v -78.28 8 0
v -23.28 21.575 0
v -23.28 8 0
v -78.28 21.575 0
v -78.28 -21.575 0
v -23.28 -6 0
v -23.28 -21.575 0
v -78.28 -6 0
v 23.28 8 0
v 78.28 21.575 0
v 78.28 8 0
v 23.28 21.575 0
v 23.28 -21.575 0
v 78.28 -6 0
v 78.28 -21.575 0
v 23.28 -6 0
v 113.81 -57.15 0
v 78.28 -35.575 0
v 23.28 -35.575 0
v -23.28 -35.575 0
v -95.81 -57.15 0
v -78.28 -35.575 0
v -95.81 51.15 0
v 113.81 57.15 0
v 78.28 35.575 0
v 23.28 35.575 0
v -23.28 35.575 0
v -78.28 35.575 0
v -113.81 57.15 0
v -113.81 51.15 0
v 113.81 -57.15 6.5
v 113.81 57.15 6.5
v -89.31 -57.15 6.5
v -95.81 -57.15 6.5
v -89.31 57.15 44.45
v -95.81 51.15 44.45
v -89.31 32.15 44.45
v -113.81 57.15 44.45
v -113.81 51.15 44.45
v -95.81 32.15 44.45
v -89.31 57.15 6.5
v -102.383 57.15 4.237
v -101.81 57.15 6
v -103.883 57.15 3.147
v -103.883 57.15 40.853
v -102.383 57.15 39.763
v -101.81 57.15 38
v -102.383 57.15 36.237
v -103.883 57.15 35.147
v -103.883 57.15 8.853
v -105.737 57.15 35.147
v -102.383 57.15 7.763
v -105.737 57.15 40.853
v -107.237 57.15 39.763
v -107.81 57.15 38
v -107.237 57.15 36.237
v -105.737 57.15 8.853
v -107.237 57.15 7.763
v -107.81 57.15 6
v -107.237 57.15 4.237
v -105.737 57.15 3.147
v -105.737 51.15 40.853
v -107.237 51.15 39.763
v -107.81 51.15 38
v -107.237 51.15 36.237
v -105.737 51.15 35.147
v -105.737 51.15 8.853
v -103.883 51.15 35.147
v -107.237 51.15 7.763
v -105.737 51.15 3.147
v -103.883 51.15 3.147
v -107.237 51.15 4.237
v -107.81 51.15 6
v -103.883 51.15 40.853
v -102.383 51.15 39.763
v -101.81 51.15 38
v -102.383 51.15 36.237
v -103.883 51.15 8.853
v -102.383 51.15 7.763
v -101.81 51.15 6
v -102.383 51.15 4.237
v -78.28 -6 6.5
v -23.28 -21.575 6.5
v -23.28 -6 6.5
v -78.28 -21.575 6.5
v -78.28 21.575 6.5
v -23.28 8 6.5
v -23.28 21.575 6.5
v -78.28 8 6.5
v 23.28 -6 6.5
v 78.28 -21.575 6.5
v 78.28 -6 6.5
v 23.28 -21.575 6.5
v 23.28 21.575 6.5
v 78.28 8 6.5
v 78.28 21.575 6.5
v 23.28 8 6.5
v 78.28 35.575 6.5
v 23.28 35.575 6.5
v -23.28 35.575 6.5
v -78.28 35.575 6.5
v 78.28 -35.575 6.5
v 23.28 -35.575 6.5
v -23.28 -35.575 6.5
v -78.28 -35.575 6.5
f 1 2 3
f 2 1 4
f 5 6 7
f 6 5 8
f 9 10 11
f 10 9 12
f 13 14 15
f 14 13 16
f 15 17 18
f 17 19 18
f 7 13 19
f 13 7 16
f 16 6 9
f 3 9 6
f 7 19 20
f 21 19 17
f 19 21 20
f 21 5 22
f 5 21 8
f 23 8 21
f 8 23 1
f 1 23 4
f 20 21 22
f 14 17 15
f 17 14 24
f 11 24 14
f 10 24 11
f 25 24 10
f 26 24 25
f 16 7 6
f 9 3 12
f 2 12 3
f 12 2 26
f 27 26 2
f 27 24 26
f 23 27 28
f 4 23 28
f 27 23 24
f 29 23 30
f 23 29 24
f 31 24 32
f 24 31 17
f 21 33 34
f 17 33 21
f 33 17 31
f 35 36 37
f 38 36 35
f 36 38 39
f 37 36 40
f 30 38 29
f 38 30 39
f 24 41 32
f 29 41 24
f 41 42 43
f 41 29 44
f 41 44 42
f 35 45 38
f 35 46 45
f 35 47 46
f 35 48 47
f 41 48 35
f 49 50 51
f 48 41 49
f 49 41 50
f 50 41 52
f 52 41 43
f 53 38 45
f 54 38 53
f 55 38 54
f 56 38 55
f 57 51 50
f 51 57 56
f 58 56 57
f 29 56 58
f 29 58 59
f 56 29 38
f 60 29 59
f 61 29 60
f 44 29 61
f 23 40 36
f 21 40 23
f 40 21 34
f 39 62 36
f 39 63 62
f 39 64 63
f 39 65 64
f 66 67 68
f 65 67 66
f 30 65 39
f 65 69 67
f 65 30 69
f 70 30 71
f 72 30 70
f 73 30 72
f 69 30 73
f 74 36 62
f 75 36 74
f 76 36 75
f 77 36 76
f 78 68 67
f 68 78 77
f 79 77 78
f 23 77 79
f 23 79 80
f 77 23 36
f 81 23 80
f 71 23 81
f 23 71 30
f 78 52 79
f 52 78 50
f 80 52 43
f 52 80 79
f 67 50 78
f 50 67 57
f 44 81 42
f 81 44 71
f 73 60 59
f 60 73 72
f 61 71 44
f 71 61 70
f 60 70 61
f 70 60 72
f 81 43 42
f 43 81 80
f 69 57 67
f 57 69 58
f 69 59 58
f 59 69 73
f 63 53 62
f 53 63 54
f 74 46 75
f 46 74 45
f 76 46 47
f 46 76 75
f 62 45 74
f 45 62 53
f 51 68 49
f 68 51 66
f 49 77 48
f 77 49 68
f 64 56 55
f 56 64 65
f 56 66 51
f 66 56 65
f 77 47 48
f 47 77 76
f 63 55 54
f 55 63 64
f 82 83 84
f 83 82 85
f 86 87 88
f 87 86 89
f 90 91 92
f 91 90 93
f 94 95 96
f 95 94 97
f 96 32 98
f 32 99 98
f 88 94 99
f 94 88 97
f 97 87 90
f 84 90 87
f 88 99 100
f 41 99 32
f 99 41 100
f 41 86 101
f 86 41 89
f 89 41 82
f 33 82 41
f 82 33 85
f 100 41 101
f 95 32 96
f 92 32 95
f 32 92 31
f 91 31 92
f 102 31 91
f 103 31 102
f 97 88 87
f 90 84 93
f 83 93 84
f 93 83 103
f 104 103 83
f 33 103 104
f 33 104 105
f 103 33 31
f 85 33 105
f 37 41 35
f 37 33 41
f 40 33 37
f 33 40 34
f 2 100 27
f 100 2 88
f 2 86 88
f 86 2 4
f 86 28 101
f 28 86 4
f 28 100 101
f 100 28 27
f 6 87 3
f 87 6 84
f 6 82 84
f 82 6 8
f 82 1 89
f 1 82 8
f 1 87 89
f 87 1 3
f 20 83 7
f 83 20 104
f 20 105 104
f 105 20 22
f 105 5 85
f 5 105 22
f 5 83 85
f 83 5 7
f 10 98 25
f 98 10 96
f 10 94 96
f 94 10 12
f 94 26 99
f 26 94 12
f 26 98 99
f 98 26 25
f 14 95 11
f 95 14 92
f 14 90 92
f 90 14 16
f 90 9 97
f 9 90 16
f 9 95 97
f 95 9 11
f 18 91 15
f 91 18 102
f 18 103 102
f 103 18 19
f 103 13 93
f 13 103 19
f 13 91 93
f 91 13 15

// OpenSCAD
// obj
wid=227.62;
dep=114.30;
hei=44.45;

// mount lip
lip_wid_back=18;
lip_dep_pos=6;
lip_dep=dep-lip_dep_pos;
lip_guard=6.5;
lip_decline_dep=25;

// screw holes
dia=6;
bot_pos=3;
sep_dist=32;
screw_hei=lip_dep_pos+0.1; // figure out why we need this 0.1

// body
body_platform=6.5;
body_wid=wid-lip_wid_back-lip_guard;
body_dep=dep;
body_hei=hei-body_platform;

// vents
// 55 x 14
vent_wid=55;
vent_hei=14;

module screw_hole(sd) {
  translate([-wid/2+lip_wid_back/2,dep/2-lip_dep_pos/2,bot_pos+dia/2+sd])
    rotate([90,,])
      cylinder(screw_hei,d=dia,center=true);
}

module vent(x,y) {
  translate([-body_wid/x,body_dep/y,0])
    linear_extrude(body_platform)
      polygon([
        [-vent_wid/2, -vent_hei/2],
        [-vent_wid/2, vent_hei/2],
        [vent_wid/2, vent_hei/2],
        [vent_wid/2, -vent_hei/2],
      ]);
}

difference() {
  // whole shelf
  linear_extrude(hei)
    polygon([
      [-wid/2, -dep/2],
      [-wid/2, dep/2],
      [wid/2, dep/2],
      [wid/2, -dep/2],
    ]);
  
  // lip
  linear_extrude(hei)
    translate([-wid/2+lip_wid_back/2,-lip_dep_pos/2,0])
      polygon([
        [-lip_wid_back/2, -lip_dep/2],
        [-lip_wid_back/2, lip_dep/2],
        [lip_wid_back/2, lip_dep/2],
        [lip_wid_back/2, -lip_dep/2],
      ]);

  // bottom screw hole
  screw_hole(sd=0);

  // top screw hole
  screw_hole(sd=sep_dist);

  // body
  translate([(lip_wid_back+lip_guard)/2,dep/2-body_dep/2,body_platform])
    linear_extrude(body_hei)
      polygon([
        [-body_wid/2, -body_dep/2],
        [-body_wid/2, body_dep/2],
        [body_wid/2, body_dep/2],
        [body_wid/2, -body_dep/2],
      ]);

  // arm gradient
  translate([-wid/2+lip_guard+lip_wid_back+0.1,-dep/2,hei])
    rotate([-90,0,90])
      linear_extrude(lip_guard+0.1)
        polygon([
          [0,0],
          [body_dep - lip_decline_dep,0],
          [0, hei - body_platform],
        ]);

  // vents
  vent(4,4);
  vent(4,body_dep);
  vent(4,-4);
  vent(-4,4);
  vent(-4,body_dep);
  vent(-4,-4);
}
